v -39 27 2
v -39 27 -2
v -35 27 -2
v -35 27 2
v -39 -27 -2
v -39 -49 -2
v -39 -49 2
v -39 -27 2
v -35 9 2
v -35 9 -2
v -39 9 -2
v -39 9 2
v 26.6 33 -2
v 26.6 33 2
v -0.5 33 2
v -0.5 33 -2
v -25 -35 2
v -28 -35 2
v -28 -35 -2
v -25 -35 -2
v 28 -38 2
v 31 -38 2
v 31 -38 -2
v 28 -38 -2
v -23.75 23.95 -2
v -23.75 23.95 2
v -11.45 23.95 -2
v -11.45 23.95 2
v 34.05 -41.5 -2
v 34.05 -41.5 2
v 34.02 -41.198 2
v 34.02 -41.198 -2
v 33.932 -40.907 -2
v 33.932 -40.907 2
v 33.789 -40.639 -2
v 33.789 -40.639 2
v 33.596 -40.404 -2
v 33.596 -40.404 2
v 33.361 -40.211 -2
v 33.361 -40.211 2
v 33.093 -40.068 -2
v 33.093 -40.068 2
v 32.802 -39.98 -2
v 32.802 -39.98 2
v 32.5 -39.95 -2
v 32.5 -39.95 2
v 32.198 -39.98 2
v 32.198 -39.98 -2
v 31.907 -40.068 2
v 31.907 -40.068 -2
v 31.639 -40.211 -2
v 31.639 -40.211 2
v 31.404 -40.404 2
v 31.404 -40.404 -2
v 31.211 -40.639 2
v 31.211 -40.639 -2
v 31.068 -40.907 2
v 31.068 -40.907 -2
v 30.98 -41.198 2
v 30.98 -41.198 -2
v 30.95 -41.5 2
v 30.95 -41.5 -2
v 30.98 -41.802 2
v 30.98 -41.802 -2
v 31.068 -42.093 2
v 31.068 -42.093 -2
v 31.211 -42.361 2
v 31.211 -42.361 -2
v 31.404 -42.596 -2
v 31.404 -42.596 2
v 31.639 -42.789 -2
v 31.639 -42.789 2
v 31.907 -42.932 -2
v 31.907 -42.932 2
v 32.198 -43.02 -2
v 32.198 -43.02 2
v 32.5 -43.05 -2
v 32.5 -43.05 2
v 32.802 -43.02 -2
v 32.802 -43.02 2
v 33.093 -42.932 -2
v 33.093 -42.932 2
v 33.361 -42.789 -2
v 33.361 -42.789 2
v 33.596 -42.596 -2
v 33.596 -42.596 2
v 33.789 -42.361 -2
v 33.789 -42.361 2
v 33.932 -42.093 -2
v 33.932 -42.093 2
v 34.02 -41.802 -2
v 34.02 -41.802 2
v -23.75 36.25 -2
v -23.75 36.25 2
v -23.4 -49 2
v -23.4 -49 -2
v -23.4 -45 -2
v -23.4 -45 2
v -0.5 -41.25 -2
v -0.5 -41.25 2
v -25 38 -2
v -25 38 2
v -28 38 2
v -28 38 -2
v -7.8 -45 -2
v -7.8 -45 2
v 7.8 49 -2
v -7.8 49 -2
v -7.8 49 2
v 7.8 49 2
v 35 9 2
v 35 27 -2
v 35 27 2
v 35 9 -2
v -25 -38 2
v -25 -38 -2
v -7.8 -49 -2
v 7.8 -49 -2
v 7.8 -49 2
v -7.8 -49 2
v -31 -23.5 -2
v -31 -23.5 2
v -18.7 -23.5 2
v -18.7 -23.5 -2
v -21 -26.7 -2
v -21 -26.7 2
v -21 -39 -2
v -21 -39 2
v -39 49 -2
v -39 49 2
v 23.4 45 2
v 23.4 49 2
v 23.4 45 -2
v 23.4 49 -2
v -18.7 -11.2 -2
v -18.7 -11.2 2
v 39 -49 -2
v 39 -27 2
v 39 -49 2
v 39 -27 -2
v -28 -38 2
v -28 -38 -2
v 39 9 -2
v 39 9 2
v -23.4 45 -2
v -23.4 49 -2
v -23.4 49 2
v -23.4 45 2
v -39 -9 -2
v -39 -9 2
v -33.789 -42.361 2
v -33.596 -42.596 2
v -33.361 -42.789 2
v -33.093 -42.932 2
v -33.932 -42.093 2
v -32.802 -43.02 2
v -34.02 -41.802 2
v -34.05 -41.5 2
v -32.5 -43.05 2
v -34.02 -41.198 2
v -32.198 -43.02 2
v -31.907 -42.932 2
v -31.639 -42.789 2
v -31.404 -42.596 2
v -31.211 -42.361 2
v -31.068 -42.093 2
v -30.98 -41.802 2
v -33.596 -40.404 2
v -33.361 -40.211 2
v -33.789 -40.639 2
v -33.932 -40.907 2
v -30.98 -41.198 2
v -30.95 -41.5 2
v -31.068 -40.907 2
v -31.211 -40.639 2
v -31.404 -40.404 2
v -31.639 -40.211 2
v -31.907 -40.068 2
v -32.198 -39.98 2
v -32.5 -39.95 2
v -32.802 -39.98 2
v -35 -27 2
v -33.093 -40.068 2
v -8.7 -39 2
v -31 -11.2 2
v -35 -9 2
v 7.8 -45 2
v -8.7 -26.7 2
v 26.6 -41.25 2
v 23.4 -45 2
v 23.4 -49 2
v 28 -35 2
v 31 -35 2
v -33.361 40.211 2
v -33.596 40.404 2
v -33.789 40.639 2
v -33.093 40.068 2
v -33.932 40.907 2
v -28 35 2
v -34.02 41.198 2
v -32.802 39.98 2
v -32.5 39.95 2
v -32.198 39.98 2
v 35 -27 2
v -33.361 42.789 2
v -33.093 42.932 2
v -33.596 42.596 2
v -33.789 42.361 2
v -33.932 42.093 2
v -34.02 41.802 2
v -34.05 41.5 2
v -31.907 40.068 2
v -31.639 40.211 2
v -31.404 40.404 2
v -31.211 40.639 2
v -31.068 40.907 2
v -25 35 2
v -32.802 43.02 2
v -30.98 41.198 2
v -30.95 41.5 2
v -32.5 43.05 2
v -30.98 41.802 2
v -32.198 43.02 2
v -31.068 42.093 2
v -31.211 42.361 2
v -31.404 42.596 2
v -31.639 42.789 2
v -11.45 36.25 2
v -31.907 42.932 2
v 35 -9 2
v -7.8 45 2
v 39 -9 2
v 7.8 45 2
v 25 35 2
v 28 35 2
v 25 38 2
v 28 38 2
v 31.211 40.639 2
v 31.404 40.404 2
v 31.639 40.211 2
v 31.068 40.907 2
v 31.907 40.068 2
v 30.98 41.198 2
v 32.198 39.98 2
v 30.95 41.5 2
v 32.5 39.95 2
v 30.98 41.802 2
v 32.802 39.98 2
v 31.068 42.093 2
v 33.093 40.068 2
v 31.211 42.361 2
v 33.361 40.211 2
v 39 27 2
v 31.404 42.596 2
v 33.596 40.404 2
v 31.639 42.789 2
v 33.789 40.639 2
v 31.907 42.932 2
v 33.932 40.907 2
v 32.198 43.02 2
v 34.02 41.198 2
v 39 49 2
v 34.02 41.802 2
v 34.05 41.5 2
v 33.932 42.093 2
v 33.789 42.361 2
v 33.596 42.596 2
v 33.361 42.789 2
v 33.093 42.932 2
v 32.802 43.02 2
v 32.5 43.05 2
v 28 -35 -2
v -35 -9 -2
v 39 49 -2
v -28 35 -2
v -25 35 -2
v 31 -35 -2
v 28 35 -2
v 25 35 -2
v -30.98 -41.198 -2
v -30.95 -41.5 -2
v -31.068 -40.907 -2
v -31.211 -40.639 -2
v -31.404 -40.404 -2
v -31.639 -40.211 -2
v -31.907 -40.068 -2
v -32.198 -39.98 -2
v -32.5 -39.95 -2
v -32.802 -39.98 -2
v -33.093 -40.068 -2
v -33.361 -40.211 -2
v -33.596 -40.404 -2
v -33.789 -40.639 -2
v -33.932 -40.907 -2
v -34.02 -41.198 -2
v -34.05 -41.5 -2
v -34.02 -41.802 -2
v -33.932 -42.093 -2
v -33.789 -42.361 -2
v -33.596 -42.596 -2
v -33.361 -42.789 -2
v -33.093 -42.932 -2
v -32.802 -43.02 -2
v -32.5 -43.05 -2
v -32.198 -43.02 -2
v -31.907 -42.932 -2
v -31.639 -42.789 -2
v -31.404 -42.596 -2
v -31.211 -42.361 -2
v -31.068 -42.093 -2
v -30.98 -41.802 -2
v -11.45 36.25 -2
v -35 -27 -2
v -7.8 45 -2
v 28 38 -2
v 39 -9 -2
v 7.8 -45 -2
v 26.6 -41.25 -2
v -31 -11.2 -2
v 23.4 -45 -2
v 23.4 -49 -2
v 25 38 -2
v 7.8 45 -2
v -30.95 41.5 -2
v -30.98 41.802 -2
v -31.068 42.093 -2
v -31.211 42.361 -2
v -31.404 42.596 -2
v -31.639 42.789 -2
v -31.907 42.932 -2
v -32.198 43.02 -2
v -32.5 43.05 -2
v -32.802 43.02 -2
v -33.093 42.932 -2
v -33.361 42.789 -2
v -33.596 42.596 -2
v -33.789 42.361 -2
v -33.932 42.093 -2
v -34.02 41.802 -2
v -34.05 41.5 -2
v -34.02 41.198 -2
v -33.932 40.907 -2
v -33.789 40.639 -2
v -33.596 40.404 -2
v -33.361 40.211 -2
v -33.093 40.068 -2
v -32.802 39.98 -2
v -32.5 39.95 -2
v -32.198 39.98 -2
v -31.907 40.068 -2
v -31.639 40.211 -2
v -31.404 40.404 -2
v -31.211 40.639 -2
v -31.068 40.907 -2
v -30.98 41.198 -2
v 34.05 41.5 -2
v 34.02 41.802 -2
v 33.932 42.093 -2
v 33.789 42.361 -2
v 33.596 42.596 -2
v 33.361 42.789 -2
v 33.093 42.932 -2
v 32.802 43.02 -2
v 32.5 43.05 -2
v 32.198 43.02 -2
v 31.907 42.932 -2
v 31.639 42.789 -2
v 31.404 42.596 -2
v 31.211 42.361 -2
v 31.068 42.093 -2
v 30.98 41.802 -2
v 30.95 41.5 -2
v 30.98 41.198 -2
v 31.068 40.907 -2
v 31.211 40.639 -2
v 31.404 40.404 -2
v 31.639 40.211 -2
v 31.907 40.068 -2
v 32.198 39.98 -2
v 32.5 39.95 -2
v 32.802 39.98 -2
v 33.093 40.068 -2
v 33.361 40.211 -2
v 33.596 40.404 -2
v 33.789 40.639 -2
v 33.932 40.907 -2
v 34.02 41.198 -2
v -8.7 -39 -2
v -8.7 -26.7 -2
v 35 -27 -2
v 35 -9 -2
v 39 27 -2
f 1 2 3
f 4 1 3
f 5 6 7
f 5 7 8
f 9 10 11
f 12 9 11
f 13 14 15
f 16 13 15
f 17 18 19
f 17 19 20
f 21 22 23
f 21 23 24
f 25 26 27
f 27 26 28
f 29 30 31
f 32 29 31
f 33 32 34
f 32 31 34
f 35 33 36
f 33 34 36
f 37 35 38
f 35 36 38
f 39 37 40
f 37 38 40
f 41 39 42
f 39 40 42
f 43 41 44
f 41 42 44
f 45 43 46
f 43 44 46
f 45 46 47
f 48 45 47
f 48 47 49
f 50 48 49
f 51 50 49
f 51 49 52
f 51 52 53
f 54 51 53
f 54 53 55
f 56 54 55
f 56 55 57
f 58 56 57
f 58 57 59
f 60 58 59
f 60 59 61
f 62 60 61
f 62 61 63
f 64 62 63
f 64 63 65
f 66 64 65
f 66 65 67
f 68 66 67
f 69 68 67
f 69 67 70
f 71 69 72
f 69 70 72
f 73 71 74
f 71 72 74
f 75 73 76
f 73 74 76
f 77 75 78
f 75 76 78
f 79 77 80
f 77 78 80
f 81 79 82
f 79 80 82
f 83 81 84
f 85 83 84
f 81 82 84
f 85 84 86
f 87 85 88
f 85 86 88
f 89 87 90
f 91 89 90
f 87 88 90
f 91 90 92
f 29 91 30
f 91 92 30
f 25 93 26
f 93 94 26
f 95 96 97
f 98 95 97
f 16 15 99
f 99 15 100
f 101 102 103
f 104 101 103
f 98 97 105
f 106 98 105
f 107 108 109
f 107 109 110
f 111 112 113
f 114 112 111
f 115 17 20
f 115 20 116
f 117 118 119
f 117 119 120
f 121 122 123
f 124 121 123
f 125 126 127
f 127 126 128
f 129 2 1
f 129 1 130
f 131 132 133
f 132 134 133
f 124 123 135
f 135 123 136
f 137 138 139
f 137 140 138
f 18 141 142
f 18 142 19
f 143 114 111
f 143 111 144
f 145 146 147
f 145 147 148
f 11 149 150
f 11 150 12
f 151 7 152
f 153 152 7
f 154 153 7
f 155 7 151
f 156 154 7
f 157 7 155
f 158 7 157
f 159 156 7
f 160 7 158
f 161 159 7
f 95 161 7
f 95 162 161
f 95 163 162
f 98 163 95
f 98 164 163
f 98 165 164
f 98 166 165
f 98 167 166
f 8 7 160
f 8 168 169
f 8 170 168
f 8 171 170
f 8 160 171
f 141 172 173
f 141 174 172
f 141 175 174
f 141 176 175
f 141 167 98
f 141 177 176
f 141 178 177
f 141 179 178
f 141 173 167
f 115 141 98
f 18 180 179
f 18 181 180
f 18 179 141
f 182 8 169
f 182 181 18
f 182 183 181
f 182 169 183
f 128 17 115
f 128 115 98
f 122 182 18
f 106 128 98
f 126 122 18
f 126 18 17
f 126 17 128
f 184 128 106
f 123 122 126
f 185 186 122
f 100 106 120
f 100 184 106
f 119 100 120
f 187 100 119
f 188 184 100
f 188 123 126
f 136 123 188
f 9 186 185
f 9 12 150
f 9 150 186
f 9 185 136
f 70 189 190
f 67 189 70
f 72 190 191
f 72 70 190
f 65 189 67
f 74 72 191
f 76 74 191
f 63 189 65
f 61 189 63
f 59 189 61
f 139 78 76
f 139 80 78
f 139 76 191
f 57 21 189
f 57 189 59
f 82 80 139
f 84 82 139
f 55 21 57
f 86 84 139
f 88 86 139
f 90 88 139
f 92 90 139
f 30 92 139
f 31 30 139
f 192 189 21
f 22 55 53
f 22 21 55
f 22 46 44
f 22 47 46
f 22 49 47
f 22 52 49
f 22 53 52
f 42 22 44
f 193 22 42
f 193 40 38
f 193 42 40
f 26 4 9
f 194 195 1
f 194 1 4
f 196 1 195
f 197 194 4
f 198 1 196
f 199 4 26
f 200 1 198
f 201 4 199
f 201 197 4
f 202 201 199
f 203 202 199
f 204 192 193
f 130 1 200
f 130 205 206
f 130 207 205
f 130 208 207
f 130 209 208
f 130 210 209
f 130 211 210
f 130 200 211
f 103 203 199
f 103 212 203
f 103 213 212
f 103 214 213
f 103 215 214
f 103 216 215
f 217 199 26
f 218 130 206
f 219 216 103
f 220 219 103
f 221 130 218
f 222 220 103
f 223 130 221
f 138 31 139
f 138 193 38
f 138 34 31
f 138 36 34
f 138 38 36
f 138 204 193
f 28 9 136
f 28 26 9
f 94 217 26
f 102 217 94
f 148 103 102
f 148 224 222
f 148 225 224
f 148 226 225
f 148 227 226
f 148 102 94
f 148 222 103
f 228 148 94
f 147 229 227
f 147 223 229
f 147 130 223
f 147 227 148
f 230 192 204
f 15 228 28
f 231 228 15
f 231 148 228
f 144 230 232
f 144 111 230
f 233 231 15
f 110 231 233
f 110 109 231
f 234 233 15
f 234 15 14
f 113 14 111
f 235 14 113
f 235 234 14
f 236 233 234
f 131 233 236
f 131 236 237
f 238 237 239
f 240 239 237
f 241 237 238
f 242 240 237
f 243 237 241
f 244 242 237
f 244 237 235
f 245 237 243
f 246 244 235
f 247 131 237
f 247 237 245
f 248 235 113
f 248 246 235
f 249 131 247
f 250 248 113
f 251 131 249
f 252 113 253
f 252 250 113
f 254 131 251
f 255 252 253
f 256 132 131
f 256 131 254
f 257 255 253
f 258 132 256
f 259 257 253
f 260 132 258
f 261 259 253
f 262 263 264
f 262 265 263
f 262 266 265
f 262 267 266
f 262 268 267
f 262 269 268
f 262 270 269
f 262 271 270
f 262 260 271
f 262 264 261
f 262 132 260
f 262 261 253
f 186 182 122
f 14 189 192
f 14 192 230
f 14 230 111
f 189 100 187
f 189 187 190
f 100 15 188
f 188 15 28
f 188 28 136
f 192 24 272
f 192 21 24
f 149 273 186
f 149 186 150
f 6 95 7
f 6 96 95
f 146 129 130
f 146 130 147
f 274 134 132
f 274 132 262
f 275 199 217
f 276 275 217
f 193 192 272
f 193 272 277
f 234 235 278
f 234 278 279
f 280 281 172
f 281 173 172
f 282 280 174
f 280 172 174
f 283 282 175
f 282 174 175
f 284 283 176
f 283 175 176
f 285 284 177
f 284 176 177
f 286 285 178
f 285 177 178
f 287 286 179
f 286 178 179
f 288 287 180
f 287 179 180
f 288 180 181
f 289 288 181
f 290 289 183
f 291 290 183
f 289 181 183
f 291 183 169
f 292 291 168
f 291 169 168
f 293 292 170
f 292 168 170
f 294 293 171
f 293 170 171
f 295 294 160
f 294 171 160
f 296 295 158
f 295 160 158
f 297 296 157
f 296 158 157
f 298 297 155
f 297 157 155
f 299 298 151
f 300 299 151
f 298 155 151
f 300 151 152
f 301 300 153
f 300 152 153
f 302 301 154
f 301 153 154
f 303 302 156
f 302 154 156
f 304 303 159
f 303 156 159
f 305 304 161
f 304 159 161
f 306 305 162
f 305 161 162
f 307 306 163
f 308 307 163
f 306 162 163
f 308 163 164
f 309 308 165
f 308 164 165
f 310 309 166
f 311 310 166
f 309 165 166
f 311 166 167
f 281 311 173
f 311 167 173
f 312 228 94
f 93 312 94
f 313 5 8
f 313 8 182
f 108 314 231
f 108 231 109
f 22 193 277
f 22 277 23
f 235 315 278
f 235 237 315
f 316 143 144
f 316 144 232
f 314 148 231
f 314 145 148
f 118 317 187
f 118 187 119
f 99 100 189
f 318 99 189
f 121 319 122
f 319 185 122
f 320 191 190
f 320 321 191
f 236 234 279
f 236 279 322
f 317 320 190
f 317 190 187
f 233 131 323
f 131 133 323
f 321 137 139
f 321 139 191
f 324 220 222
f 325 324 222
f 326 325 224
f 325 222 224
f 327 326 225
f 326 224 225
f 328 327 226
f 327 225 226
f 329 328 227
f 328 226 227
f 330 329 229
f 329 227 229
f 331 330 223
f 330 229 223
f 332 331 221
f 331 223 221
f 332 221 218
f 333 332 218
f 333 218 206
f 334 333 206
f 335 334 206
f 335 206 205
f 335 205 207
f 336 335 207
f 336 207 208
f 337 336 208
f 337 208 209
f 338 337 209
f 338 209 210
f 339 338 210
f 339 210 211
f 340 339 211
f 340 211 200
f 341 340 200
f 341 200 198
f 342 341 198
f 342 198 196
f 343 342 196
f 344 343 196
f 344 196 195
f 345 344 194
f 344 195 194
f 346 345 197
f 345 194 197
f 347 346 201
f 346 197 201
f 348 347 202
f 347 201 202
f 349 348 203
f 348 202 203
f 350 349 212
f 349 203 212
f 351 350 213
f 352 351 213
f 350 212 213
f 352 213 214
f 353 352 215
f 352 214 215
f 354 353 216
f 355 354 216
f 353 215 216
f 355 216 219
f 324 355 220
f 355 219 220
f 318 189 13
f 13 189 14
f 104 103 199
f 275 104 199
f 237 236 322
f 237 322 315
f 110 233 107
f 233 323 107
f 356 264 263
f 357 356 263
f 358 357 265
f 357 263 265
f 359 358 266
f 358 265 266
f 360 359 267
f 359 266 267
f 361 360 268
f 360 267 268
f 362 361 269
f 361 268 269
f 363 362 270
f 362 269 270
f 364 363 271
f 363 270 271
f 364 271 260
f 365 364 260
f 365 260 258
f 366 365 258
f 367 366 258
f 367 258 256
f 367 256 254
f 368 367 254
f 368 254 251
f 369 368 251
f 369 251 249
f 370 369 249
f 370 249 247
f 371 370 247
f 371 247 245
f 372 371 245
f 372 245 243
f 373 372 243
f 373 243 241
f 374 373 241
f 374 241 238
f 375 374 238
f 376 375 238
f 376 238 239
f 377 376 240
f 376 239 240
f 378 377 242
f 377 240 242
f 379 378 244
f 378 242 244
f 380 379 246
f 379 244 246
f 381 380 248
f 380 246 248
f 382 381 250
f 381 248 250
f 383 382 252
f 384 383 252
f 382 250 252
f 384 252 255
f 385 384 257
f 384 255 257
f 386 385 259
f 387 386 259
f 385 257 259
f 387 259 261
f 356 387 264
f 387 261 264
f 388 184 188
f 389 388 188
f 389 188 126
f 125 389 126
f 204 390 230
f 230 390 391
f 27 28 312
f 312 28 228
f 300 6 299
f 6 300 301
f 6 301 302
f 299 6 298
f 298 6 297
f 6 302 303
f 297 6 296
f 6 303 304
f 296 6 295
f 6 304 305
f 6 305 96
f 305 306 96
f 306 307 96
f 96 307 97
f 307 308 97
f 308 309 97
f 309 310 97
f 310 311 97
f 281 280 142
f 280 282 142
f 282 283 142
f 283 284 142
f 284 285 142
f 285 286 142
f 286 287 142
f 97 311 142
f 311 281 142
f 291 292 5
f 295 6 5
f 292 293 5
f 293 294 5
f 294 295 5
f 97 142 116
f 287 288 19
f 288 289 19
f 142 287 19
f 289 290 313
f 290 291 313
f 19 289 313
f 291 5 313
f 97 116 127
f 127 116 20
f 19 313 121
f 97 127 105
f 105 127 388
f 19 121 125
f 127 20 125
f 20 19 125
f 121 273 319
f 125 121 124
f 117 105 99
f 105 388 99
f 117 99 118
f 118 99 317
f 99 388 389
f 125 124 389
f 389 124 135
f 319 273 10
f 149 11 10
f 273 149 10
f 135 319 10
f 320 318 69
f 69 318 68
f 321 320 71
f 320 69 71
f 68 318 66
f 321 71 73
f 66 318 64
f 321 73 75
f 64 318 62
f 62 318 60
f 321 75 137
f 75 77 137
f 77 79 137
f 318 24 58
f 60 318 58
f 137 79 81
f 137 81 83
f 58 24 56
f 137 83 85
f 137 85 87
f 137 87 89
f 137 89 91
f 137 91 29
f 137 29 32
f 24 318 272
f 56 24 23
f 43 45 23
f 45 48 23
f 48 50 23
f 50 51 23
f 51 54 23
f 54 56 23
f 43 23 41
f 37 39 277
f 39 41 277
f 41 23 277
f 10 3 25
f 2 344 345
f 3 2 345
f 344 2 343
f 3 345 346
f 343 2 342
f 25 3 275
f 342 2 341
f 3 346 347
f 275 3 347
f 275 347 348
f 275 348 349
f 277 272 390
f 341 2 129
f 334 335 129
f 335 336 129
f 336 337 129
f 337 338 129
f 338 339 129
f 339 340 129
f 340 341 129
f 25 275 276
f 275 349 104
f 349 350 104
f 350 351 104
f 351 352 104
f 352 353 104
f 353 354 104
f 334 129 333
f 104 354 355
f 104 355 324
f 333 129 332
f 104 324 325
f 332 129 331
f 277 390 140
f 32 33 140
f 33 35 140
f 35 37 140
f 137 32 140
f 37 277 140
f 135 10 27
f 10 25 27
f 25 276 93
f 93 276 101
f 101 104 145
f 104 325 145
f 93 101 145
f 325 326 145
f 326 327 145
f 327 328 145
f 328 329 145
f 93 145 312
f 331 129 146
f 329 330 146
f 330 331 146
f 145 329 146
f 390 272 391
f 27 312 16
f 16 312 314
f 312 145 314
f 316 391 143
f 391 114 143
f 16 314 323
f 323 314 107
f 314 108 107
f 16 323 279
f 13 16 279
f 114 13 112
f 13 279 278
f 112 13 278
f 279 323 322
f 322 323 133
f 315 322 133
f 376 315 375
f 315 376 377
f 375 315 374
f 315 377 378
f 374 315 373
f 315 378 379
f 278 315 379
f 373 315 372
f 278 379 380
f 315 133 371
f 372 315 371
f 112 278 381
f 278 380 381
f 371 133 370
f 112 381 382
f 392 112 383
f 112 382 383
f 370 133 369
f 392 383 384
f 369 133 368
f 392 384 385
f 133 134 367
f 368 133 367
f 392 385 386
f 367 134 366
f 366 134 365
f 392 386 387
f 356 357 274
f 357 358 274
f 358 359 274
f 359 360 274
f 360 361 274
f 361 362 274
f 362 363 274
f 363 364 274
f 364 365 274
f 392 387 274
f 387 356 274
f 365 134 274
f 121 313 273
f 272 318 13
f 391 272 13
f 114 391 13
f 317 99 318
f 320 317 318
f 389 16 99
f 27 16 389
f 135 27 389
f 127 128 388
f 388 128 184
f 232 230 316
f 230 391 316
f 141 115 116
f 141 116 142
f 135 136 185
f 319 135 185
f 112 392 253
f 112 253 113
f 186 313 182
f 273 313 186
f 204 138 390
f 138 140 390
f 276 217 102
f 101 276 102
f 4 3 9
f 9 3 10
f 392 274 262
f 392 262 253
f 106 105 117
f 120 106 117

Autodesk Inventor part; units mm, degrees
ref_plane "YZ Plane" through (0, 0, 0) normal (1, 0, 0) x (0, 1, 0)
ref_plane "XZ Plane" through (0, 0, 0) normal (0, 1, 0) x (-1, 0, 0)
ref_plane "XY Plane" through (0, 0, 0) normal (0, 0, 1) x (1, 0, 0)
sketch "Sketch1" plane through (0, 0, 0) normal (0, 0, 1) x (1, 0, 0)
  line L0 (-39, 49) -> (39, 49)
  line L1 (39, 49) -> (39, -49)
  line L2 (39, -49) -> (-39, -49)
  line L3 (-39, -49) -> (-39, 49)
  line L4 (-23.4, -45) -> (-7.8, -45)
  line L5 (-7.8, -45) -> (-7.8, -49)
  line L6 (-7.8, -49) -> (-23.4, -49)
  line L7 (-23.4, -49) -> (-23.4, -45)
  line L8 (-39, -27) -> (-35, -27)
  line L9 (-35, -27) -> (-35, -9)
  line L10 (-35, -9) -> (-39, -9)
  line L11 (-39, -9) -> (-39, -27)
  line L12 (0, 0) -> (8.9596, 0)
  line L13 (0, 0) -> (0, 8.0367)
  line L14 (-23.4, 45) -> (-7.8, 45)
  line L15 (-7.8, 45) -> (-7.8, 49)
  line L16 (-23.4, 49) -> (-23.4, 45)
  line L17 (-39, 27) -> (-35, 27)
  line L18 (-35, 27) -> (-35, 9)
  line L19 (-35, 9) -> (-39, 9)
  line L20 (23.4, -45) -> (7.8, -45)
  line L21 (7.8, -45) -> (7.8, -49)
  line L22 (23.4, -49) -> (23.4, -45)
  line L23 (39, -27) -> (35, -27)
  line L24 (35, -27) -> (35, -9)
  line L25 (35, -9) -> (39, -9)
  line L26 (0, 0) -> (-8.9596, 0)
  line L27 (39, 27) -> (35, 27)
  line L28 (35, 27) -> (35, 9)
  line L29 (35, 9) -> (39, 9)
  line L30 (7.8, 45) -> (7.8, 49)
  line L31 (23.4, 49) -> (23.4, 45)
  line L32 (23.4, 45) -> (7.8, 45)
  point P0 (0, 49)
  point P1 (39, 0)
  point P2 (0, -49)
  point P3 (-7.8, -47)
  point P4 (-37, -9)
  dimension "d0" = 98
  dimension "d1" = 78
  dimension "d2" = 15.6
  dimension "d3" = 4
  dimension "d4" = 4
  dimension "d5" = 18
  dimension "d6" = 7.8
  dimension "d7" = 9
extrude "Extrusion1" add sketch "Sketch1" along normal mid plane 4 contours L0 L16 L14 L15 L30 L32 L31 L1 L27 L28 L29 L25 L24 L23 L2 L22 L20 L21 L5 L4 L7 L3 L8 L9 L10 L19 L18 L17
sketch "Sketch2" plane through (0, 0, 2) normal (0, 0, 1) x (1, 0, 0)
  line L0 (-21, -39) -> (-8.7, -39)
  line L1 (-8.7, -39) -> (-8.7, -26.7)
  line L2 (-8.7, -26.7) -> (-21, -26.7)
  line L3 (-21, -26.7) -> (-21, -39)
  line L4 (-35, -9) -> (-35, -27) projected
  line L5 (-23.4, -45) -> (-7.8, -45) projected
  line L6 (-18.7, -11.2) -> (-31, -11.2)
  line L7 (-31, -11.2) -> (-31, -23.5)
  line L8 (-31, -23.5) -> (-18.7, -23.5)
  line L9 (-18.7, -23.5) -> (-18.7, -11.2)
  line L10 (-11.45, 36.25) -> (-23.75, 36.25)
  line L11 (-23.75, 36.25) -> (-23.75, 23.95)
  line L12 (-23.75, 23.95) -> (-11.45, 23.95)
  line L13 (-11.45, 23.95) -> (-11.45, 36.25)
  line L14 (-7.8, 45) -> (-23.4, 45) projected
  line L15 (-35, 27) -> (-35, 9) projected
  line L16 (26.6, 33) -> (-0.5, 33)
  line L17 (-0.5, 33) -> (-0.5, -41.25)
  line L18 (-0.5, -41.25) -> (26.6, -41.25)
  line L19 (26.6, -41.25) -> (26.6, 33)
  line L20 (23.4, 45) -> (7.8, 45) projected
  circle A0 centre (-32.5, -41.5) radius 1.55
  line L21 (35, 9) -> (35, 27) projected
  line L22 (0, 0) -> (5.8135, 0)
  line L23 (0, 0) -> (0, 4.2513)
  line L24 (7.8, -45) -> (23.4, -45) projected
  line L25 (35, -27) -> (35, -9) projected
  line L26 (-28, -35) -> (-25, -35)
  line L27 (-25, -35) -> (-25, -38)
  line L28 (-25, -38) -> (-28, -38)
  line L29 (-28, -38) -> (-28, -35)
  line L30 (-39, -49) -> (-23.4, -49) projected
  line L31 (-39, -27) -> (-39, -49) projected
  circle A1 centre (-32.5, 41.5) radius 1.55
  line L32 (-28, 35) -> (-25, 35)
  line L33 (-25, 35) -> (-25, 38)
  line L34 (-25, 38) -> (-28, 38)
  line L35 (-28, 38) -> (-28, 35)
  line L36 (28, 35) -> (25, 35)
  line L37 (25, 35) -> (25, 38)
  line L38 (28, 38) -> (28, 35)
  line L39 (25, 38) -> (28, 38)
  circle A2 centre (32.5, 41.5) radius 1.55
  circle A3 centre (32.5, -41.5) radius 1.55
  line L40 (28, -35) -> (31, -35)
  line L41 (31, -35) -> (31, -38)
  line L42 (31, -38) -> (28, -38)
  line L43 (28, -38) -> (28, -35)
  line L44 (23.4, -49) -> (39, -49) projected
  line L45 (39, -49) -> (39, -27) projected
  point P0 (-17.6, 36.25)
  point P1 (-8.7, -32.85)
  point P2 (-39, -38)
  point P3 (29.5, -38)
  dimension "d10" = 12.3
  dimension "d11" = 12.3
  dimension "d12" = 14
  dimension "d13" = 6
  dimension "d14" = 4
  dimension "d15" = 21.5
  dimension "d16" = 12.3
  dimension "d17" = 12.3
  dimension "d18" = 8.75
  dimension "d19" = 11.25
  dimension "d20" = 12.3
  dimension "d21" = 12.3
  dimension "d24" = 27.1
  dimension "d25" = 34.5
  dimension "d26" = 12
  dimension "d29" = 3.1
  dimension "d30" = 3.5
  dimension "d31" = 2.5
  dimension "d49" = 3
  dimension "d50" = 3
  dimension "d51" = 11
  dimension "d52" = 11
  dimension "d53" = 3
  dimension "d54" = 3
  dimension "d55" = 11
  dimension "d56" = 8
extrude "Extrusion2" cut sketch "Sketch2" against normal up to surface (4 mm away)
equation "\"d6\" = 0.5 * d2"
equation "\"d7\" = 0.5 * d5"
equation "\"d11\" = d10"
equation "\"d16\" = d10"
equation "\"d17\" = d10"
equation "\"d20\" = d16"
equation "\"d21\" = d20"
equation "\"d50\" = d49"
equation "\"d52\" = d51"
properties part number "Top"
